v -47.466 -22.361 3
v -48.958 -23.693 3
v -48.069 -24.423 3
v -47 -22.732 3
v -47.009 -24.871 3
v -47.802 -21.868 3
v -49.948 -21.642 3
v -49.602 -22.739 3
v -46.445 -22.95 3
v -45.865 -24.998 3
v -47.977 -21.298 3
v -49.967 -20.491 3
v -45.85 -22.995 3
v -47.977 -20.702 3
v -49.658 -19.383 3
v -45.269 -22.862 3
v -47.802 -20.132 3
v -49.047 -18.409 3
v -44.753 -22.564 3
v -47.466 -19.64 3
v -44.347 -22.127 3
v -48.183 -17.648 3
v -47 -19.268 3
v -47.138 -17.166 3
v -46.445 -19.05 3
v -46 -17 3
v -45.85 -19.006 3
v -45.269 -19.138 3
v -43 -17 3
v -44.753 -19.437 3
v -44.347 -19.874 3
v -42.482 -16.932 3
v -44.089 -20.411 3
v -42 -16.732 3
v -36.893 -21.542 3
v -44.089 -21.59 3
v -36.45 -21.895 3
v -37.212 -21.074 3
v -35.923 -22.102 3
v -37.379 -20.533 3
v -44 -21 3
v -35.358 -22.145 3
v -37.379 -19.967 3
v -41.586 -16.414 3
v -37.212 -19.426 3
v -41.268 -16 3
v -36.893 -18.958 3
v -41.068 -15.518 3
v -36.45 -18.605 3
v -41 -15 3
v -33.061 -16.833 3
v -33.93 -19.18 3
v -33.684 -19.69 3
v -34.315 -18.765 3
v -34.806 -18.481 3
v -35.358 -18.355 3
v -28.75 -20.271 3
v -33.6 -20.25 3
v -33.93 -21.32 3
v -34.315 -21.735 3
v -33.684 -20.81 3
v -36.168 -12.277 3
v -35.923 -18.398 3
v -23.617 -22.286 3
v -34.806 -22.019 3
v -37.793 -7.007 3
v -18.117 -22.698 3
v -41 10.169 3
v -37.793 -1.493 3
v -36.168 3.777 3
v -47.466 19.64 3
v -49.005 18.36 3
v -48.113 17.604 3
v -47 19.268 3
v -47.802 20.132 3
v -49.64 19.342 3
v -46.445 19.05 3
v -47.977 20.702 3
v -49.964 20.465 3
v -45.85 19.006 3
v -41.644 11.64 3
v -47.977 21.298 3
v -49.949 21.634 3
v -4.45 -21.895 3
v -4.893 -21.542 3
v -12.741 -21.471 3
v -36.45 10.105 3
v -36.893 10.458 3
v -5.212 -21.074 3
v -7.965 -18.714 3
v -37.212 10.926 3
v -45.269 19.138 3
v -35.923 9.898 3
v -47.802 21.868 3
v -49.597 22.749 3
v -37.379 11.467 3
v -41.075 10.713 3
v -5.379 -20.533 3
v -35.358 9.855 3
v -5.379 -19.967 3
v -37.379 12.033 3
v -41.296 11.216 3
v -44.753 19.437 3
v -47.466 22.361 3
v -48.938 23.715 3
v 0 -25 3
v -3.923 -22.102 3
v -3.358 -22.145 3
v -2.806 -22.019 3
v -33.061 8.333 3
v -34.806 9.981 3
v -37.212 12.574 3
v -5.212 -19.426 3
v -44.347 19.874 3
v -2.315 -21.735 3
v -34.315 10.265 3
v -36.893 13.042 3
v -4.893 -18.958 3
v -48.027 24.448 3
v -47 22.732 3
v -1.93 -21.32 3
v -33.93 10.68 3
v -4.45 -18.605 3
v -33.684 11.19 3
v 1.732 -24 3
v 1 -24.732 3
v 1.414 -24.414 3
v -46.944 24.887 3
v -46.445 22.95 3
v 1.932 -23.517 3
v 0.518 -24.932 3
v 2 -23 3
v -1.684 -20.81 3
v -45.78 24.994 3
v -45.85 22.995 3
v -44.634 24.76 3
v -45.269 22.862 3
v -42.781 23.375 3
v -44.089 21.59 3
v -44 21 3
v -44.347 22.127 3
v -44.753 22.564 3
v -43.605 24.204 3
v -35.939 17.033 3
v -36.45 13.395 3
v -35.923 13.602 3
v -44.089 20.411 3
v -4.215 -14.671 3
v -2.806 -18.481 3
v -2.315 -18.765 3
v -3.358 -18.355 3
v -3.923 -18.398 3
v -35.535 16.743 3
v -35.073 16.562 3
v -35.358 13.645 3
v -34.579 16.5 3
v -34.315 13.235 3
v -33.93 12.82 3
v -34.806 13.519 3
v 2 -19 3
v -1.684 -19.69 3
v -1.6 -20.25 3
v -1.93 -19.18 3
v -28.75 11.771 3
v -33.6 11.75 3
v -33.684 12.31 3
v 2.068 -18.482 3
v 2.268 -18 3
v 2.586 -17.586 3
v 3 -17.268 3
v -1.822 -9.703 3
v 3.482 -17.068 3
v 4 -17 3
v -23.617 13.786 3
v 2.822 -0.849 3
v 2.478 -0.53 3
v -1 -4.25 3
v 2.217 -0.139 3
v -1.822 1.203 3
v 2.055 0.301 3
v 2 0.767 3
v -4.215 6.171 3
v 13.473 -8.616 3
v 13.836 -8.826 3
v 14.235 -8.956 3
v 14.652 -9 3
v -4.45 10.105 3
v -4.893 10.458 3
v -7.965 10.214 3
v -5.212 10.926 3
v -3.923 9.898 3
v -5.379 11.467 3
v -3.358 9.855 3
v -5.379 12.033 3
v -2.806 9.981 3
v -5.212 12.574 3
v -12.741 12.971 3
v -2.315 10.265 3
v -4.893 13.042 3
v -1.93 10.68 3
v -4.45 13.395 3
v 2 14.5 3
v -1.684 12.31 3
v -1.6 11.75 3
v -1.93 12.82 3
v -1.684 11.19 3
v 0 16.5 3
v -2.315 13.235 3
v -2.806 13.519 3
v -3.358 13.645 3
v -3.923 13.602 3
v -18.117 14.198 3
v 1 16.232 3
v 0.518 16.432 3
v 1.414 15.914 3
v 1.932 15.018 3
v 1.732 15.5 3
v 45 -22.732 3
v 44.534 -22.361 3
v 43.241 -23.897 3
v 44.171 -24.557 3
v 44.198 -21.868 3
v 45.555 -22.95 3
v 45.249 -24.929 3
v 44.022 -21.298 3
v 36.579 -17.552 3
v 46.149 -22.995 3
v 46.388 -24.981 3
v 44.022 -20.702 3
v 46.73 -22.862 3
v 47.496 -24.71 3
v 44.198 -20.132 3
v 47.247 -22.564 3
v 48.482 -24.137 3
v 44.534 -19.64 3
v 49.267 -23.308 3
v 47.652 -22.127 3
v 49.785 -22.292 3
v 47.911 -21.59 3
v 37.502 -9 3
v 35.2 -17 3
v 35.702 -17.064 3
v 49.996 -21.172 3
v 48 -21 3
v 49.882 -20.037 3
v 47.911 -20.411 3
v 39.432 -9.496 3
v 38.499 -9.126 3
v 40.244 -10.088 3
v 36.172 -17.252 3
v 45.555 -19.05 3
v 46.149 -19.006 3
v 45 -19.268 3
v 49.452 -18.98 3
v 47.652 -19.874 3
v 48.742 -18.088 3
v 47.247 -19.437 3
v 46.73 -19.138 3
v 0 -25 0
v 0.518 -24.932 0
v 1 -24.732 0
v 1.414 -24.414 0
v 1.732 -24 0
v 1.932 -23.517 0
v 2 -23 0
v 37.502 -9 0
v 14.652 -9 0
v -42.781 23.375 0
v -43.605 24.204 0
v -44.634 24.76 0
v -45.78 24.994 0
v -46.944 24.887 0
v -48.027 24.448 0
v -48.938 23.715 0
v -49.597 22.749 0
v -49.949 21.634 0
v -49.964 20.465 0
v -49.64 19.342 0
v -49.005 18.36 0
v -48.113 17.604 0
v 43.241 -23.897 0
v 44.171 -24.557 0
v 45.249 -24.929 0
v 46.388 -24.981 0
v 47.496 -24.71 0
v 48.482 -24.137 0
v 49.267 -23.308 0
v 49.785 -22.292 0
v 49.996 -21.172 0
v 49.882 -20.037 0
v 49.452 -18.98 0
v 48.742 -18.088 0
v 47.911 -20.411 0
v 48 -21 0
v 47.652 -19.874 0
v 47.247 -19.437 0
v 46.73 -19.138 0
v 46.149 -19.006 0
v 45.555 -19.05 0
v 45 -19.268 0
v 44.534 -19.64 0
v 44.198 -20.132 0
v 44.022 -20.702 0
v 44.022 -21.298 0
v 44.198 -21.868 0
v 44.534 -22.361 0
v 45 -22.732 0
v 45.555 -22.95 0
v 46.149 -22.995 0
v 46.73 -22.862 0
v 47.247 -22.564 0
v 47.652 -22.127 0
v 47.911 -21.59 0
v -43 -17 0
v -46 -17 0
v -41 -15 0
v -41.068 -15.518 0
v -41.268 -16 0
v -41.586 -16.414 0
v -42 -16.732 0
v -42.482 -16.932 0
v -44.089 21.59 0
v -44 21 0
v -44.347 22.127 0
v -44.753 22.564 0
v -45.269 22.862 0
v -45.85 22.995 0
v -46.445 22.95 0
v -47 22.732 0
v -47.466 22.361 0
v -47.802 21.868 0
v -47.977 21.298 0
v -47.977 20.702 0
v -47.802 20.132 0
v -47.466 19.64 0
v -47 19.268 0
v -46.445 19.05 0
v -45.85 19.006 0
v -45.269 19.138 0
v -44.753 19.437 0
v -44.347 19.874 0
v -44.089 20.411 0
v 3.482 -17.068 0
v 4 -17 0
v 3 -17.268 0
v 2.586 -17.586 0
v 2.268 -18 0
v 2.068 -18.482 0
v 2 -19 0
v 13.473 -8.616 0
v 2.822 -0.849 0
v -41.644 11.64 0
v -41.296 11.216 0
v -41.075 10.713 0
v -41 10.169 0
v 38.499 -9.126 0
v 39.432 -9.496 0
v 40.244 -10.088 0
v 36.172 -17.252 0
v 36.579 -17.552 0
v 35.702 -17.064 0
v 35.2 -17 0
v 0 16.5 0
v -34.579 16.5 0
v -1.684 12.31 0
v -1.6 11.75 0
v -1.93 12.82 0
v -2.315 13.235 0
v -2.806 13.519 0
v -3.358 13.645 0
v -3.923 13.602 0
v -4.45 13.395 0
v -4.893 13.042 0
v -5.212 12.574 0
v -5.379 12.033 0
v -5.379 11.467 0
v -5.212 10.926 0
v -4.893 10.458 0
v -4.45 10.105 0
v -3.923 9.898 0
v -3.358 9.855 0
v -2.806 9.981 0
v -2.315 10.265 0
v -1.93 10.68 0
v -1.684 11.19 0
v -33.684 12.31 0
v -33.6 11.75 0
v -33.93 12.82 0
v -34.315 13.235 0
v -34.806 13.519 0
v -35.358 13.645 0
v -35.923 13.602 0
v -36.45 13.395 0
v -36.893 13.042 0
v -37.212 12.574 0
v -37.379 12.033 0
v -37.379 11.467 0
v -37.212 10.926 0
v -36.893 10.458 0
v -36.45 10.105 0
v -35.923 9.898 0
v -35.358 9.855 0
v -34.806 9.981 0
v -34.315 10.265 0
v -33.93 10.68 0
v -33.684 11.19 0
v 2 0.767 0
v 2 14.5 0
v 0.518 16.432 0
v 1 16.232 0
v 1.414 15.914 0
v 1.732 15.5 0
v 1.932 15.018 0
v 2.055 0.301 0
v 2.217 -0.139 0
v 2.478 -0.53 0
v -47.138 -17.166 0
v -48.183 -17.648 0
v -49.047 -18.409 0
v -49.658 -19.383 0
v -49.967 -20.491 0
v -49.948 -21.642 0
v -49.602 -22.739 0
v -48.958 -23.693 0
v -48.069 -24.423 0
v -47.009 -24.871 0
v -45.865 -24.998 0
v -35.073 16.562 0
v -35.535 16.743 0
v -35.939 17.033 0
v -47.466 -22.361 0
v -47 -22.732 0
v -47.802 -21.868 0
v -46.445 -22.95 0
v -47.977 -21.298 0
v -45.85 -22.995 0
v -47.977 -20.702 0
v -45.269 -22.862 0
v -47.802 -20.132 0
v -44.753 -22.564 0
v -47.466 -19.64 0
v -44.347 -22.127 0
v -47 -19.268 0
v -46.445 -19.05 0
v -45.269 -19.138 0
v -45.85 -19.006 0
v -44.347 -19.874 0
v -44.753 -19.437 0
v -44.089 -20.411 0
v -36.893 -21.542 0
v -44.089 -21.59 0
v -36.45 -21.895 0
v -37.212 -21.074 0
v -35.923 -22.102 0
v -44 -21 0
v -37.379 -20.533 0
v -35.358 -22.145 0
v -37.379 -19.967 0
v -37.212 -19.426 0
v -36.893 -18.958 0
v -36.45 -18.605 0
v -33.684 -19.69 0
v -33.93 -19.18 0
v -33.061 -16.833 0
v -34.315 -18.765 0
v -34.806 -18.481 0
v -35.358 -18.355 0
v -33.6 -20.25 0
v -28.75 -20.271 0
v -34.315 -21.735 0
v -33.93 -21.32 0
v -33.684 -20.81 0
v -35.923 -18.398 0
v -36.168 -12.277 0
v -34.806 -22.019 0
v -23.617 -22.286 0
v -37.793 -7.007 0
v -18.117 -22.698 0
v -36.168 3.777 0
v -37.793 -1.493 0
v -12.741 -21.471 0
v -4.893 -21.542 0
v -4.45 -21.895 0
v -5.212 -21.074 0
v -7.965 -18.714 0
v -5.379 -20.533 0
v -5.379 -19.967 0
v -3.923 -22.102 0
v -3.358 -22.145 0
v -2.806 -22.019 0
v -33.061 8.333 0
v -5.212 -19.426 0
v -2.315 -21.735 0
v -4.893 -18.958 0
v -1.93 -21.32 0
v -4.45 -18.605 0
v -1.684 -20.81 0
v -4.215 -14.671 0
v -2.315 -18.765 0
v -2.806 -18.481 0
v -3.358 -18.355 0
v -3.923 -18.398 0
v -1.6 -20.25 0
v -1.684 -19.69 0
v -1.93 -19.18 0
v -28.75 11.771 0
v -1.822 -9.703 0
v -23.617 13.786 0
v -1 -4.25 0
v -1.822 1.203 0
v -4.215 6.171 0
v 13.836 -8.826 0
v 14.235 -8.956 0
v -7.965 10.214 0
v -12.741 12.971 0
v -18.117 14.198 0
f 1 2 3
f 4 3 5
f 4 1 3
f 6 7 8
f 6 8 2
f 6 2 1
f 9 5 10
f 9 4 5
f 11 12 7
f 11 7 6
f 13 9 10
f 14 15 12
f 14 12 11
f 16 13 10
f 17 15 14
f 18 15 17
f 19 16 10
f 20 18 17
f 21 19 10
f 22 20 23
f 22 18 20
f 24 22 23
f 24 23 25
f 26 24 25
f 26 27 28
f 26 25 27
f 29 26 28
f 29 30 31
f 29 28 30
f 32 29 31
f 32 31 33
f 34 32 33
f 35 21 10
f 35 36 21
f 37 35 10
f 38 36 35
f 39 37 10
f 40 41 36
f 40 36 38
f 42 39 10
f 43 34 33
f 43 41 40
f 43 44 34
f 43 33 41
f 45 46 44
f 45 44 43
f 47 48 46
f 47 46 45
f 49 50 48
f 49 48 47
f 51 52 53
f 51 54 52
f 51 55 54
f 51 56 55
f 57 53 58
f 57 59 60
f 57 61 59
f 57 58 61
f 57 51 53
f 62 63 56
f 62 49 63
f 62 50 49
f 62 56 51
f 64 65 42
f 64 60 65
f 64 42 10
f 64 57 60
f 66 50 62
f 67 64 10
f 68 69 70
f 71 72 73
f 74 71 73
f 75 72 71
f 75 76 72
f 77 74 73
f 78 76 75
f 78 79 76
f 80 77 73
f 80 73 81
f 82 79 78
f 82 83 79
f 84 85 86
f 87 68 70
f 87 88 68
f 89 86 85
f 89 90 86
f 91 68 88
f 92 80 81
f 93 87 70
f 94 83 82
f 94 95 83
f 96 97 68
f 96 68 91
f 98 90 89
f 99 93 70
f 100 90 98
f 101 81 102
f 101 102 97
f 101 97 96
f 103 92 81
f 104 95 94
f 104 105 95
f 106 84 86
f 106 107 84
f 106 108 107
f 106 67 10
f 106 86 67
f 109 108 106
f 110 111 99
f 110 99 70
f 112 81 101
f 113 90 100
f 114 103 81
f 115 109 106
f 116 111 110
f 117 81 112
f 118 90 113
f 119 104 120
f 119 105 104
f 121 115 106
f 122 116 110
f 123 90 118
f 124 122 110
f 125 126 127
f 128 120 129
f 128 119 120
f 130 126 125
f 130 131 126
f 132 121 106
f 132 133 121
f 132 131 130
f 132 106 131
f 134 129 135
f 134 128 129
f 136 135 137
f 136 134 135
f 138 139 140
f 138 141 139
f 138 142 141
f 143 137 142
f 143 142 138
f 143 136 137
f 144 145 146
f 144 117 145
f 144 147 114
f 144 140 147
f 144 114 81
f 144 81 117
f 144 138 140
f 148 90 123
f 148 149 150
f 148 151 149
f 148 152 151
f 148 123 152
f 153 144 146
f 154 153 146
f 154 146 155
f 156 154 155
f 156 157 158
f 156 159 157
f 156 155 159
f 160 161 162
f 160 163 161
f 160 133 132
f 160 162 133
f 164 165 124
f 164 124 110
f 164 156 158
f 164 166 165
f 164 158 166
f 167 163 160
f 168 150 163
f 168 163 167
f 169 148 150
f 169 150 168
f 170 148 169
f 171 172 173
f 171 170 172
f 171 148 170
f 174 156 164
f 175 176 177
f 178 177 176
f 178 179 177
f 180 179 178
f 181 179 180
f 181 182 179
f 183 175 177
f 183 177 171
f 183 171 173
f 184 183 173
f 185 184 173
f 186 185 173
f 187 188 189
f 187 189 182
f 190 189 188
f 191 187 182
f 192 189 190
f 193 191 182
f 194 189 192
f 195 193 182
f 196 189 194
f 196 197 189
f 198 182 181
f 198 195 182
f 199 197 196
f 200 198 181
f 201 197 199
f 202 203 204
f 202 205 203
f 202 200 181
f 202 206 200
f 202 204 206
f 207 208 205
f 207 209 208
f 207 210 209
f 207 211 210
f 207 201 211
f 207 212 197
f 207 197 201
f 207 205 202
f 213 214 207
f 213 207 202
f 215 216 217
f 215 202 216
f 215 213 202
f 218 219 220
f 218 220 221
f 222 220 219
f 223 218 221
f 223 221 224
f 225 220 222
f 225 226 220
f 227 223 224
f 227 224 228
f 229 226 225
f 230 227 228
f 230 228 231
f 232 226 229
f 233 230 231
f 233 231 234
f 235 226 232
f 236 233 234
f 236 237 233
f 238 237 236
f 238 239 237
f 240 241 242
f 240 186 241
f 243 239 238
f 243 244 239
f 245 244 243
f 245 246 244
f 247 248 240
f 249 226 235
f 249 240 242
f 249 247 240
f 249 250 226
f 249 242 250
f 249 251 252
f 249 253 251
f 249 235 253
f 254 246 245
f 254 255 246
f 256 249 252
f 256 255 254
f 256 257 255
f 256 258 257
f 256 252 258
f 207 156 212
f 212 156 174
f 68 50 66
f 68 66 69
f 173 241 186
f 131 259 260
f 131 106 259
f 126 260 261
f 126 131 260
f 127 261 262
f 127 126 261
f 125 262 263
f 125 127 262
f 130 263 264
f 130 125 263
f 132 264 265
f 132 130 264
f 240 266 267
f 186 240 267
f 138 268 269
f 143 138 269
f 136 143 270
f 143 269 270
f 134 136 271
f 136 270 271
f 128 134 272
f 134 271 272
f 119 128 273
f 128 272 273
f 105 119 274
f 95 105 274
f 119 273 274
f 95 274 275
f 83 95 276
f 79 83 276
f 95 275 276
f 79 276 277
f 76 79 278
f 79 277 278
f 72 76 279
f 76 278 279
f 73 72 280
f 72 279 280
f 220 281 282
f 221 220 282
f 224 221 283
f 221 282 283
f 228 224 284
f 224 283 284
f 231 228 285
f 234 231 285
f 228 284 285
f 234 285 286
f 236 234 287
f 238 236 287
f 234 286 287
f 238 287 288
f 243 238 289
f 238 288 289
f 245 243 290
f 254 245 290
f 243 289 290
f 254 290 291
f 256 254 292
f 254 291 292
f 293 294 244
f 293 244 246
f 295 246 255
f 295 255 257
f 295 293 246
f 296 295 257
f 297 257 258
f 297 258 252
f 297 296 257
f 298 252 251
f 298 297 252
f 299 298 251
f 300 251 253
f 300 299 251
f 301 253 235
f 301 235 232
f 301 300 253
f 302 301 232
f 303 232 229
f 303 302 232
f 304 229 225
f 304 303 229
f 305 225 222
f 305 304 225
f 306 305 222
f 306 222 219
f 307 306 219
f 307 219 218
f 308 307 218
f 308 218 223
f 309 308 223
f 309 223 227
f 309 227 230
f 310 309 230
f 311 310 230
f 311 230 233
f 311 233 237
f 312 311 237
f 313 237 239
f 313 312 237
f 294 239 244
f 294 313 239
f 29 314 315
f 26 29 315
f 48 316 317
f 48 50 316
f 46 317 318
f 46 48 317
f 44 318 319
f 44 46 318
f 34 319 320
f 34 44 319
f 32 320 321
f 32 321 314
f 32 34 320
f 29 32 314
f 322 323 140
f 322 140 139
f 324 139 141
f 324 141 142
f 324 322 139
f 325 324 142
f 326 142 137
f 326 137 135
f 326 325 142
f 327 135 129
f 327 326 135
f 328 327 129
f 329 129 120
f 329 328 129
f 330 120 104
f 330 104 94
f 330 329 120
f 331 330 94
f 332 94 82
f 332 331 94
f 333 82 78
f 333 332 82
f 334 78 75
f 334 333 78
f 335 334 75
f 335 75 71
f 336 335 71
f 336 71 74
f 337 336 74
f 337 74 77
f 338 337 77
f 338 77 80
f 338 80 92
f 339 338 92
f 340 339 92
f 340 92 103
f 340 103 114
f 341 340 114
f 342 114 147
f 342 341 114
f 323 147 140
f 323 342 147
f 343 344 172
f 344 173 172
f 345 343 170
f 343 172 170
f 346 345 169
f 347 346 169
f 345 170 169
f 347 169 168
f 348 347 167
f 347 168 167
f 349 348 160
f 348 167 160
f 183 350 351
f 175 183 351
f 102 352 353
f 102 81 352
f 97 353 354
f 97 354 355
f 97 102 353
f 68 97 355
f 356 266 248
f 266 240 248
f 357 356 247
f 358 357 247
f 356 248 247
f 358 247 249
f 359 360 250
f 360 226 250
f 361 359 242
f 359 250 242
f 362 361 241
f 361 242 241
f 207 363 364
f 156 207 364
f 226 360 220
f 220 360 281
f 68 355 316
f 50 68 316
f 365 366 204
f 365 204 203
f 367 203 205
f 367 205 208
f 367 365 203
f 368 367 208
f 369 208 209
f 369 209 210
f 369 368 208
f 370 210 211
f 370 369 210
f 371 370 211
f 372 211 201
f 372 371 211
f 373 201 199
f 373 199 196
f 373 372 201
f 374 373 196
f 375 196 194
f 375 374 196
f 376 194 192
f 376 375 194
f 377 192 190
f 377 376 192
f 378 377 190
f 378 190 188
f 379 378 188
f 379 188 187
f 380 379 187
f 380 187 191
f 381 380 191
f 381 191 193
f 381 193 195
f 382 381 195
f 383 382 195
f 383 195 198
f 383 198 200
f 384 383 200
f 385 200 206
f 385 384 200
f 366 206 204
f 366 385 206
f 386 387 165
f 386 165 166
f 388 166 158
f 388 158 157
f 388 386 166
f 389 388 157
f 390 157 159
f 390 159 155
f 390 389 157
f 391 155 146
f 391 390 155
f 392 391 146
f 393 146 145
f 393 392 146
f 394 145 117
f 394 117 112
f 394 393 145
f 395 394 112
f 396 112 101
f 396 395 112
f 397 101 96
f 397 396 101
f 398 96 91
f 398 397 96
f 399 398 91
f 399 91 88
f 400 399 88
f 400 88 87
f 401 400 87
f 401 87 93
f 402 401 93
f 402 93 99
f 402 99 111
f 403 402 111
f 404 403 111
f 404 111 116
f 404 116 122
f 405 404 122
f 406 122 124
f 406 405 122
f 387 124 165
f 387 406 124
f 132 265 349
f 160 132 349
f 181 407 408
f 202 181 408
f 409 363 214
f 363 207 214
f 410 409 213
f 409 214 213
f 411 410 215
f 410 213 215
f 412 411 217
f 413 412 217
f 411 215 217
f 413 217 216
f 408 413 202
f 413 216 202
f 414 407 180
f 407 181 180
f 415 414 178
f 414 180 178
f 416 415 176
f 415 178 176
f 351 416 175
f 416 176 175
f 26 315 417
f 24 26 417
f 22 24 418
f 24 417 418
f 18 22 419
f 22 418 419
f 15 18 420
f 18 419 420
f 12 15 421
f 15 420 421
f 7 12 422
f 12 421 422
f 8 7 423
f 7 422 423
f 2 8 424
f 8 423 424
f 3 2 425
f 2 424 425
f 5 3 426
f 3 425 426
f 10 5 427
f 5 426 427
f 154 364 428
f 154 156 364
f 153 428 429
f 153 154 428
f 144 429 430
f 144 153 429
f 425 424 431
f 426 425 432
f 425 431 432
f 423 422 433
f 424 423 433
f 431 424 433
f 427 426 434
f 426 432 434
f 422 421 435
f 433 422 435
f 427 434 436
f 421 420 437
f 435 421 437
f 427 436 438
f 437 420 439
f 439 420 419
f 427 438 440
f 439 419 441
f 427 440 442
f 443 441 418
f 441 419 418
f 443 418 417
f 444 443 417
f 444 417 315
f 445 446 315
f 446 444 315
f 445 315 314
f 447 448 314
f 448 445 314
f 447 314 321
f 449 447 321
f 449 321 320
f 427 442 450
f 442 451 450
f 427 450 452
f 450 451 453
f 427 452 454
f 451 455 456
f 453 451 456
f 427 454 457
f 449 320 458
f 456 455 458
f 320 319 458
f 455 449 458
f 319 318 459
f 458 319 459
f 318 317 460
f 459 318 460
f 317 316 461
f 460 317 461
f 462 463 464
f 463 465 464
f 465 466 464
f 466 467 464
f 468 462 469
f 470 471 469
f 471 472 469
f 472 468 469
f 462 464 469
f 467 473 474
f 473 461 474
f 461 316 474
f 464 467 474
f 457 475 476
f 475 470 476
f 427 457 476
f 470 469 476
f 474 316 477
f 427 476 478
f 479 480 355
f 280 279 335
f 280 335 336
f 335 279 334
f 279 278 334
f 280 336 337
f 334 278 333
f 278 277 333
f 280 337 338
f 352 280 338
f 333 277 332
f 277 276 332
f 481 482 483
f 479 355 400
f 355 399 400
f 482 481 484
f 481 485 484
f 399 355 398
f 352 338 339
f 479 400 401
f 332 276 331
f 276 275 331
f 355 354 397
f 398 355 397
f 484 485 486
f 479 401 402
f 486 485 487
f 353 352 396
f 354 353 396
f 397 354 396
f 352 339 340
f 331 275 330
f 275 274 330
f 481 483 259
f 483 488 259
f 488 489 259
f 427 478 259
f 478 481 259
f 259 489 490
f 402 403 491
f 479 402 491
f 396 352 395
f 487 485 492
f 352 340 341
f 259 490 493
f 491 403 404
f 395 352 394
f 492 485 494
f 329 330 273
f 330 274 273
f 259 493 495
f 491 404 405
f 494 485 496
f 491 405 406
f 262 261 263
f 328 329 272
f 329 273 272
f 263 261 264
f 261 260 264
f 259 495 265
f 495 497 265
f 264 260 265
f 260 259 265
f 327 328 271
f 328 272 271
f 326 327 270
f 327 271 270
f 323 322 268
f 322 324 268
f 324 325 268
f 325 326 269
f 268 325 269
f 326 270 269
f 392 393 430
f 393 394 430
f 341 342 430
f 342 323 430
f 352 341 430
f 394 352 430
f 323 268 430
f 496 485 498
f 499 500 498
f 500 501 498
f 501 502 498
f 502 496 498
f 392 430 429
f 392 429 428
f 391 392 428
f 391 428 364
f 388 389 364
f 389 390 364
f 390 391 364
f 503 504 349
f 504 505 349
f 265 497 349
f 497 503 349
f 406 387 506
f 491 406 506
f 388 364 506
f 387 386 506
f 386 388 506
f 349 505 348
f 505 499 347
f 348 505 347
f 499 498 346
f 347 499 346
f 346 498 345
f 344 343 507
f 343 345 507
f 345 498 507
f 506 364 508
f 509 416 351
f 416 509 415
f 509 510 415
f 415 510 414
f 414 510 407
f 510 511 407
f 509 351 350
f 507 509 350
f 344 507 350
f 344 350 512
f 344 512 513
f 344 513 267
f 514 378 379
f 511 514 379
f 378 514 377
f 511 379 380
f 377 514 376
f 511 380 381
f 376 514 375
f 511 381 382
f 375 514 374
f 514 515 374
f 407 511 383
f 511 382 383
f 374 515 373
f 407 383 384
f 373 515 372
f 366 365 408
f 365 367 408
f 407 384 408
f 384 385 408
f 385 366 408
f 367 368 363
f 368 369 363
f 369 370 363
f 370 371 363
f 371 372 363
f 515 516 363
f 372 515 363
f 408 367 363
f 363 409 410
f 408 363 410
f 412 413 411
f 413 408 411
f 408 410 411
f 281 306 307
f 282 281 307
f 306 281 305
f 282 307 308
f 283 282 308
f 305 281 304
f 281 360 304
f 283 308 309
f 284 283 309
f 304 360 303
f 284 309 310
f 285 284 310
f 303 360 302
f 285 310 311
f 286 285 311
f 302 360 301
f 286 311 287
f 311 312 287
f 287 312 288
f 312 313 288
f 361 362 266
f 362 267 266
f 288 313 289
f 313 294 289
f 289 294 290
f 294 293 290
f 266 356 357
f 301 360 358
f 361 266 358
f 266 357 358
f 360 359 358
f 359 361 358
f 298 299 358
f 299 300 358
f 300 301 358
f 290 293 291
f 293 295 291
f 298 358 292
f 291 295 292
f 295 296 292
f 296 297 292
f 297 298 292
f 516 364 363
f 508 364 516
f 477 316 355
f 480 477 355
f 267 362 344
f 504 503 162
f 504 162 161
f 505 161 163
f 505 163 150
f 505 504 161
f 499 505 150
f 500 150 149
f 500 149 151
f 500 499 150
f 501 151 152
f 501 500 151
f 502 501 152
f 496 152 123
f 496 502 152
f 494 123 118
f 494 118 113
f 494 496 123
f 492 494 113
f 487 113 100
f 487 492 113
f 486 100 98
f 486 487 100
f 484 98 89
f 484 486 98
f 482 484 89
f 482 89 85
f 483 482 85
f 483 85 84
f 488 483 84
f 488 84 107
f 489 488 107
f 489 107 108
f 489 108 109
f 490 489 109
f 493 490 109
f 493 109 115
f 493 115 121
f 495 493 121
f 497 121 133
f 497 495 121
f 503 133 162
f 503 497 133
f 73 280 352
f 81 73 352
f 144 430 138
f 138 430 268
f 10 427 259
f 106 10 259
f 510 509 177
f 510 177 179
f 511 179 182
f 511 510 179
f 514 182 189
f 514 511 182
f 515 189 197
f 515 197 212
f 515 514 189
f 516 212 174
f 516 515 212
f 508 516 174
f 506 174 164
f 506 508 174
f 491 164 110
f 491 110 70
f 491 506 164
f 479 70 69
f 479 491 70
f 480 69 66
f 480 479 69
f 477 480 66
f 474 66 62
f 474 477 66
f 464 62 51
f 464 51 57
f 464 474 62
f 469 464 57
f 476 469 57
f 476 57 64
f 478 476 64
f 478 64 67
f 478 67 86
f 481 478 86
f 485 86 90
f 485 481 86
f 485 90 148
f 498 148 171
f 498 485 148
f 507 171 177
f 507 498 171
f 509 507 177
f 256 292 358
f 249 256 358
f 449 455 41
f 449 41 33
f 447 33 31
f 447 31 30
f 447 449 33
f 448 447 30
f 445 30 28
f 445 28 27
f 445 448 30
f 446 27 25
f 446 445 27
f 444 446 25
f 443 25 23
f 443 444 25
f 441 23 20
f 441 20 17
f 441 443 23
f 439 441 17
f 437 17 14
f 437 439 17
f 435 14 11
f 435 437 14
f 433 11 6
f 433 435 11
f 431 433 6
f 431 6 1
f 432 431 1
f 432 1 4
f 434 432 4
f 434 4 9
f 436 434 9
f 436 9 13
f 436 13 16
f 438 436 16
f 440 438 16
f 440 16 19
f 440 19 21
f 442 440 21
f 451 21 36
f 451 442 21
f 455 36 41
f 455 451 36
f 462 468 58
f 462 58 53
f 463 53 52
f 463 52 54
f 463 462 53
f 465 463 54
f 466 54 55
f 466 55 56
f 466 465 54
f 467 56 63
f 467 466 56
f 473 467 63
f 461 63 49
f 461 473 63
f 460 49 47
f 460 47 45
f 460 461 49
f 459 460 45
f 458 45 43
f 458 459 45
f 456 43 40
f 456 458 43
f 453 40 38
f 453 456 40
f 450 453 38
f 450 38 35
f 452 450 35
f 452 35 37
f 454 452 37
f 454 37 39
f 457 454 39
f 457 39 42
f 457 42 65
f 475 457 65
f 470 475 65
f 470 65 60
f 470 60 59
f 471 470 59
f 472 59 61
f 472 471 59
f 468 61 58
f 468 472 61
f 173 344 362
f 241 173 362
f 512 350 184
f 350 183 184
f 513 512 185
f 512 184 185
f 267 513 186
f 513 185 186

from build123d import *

# Parameters (mm, degrees)
F0_R     = 2
F0_R_2   = 1.9
F0_R_3   = 18.5
F1_DEPTH = 3
F2_R     = 2
F3_R     = 4


with BuildPart() as f1:
    # F0 (on Top) → F1 (new body)
    with BuildSketch(Plane.XY):
        with BuildLine():
            Line((2.0000000052, 16.5001536438), (-35.3637253092, 16.5001536438))
            Line((-35.3637253092, 16.5001536438), (-42.7812429201, 23.375301328))
            ThreePointArc((-42.7812429201, 23.375301328), (-48.9377019653, 23.7146468067), (-48.1133599984, 17.6041964427))
            Line((-48.1133599984, 17.6041964427), (-40.9999999948, 11.0457026558))
            Line((-40.9999999948, 11.0457026558), (-40.9999999948, -17.0001679047))
            Line((-40.9999999948, -17.0001679047), (-45.9997427603, -17.0001679047))
            ThreePointArc((-45.9997427603, -17.0001679047), (-49.9991778461, -21.0673913699), (-45.8653148176, -24.9979084075))
            Line((-45.8653148176, -24.9979084075), (2.0000000052, -24.9998463562))
            Line((2.0000000052, -24.9998463562), (2.0000000052, -16.9998463562))
            Line((2.0000000052, -16.9998463562), (14.0000000052, -16.9998463562))
            Line((14.0000000052, -16.9998463562), (36.0000000052, -16.9998463562))
            Line((36.0000000052, -16.9998463562), (43.2410032397, -23.8966064518))
            ThreePointArc((43.2410032397, -23.8966064518), (48.9041379149, -23.7505294783), (48.7417034391, -18.0878403757))
            Line((48.7417034391, -18.0878403757), (39.0890352428, -8.999838983))
            Line((39.0890352428, -8.999838983), (14.0000000052, -8.999838983))
            Line((14.0000000052, -8.999838983), (2.0000000052, -0.2498463562))
            Line((2.0000000052, -0.2498463562), (2.0000000052, 16.5001536438))
        make_face()
        with Locations((-45.9997427603, -21.0001679047)):
            Circle(F0_R, mode=Mode.SUBTRACT)
        with Locations((-35.5, -20.25)):
            Circle(F0_R_2, mode=Mode.SUBTRACT)
        with Locations((-3.5, -20.25)):
            Circle(F0_R_2, mode=Mode.SUBTRACT)
        with Locations((-19.5, -4.25)):
            Circle(F0_R_3, mode=Mode.SUBTRACT)
        with Locations((45.9997427603, -21.0001679047)):
            Circle(F0_R, mode=Mode.SUBTRACT)
        with Locations((-35.5, 11.75)):
            Circle(F0_R_2, mode=Mode.SUBTRACT)
        with Locations((-3.5, 11.75)):
            Circle(F0_R_2, mode=Mode.SUBTRACT)
        with Locations((-45.9997427603, 21.0001679047)):
            Circle(F0_R, mode=Mode.SUBTRACT)
    extrude(amount=F1_DEPTH)

    # F2
    f2_edges = [f1.edges().sort_by_distance(p)[0] for p in [
        (-41, -17.000168, 1.5),
        (-41, 11.045703, 1.5),
        (-35.363725, 16.500154, 1.5),
        (2, 16.500154, 1.5),
        (2, -16.999846, 1.5),
        (2, -0.249846, 1.5),
        (36, -16.999846, 1.5),
        (2, -24.999846, 1.5),
        (14, -8.999839, 1.5),
    ]]
    fillet(f2_edges, radius=F2_R)

    # F3
    f3_edges = [f1.edges().sort_by_distance(p)[0] for p in [
        (39.089035, -8.999839, 1.5),
    ]]
    fillet(f3_edges, radius=F3_R)


solid = f1.part
